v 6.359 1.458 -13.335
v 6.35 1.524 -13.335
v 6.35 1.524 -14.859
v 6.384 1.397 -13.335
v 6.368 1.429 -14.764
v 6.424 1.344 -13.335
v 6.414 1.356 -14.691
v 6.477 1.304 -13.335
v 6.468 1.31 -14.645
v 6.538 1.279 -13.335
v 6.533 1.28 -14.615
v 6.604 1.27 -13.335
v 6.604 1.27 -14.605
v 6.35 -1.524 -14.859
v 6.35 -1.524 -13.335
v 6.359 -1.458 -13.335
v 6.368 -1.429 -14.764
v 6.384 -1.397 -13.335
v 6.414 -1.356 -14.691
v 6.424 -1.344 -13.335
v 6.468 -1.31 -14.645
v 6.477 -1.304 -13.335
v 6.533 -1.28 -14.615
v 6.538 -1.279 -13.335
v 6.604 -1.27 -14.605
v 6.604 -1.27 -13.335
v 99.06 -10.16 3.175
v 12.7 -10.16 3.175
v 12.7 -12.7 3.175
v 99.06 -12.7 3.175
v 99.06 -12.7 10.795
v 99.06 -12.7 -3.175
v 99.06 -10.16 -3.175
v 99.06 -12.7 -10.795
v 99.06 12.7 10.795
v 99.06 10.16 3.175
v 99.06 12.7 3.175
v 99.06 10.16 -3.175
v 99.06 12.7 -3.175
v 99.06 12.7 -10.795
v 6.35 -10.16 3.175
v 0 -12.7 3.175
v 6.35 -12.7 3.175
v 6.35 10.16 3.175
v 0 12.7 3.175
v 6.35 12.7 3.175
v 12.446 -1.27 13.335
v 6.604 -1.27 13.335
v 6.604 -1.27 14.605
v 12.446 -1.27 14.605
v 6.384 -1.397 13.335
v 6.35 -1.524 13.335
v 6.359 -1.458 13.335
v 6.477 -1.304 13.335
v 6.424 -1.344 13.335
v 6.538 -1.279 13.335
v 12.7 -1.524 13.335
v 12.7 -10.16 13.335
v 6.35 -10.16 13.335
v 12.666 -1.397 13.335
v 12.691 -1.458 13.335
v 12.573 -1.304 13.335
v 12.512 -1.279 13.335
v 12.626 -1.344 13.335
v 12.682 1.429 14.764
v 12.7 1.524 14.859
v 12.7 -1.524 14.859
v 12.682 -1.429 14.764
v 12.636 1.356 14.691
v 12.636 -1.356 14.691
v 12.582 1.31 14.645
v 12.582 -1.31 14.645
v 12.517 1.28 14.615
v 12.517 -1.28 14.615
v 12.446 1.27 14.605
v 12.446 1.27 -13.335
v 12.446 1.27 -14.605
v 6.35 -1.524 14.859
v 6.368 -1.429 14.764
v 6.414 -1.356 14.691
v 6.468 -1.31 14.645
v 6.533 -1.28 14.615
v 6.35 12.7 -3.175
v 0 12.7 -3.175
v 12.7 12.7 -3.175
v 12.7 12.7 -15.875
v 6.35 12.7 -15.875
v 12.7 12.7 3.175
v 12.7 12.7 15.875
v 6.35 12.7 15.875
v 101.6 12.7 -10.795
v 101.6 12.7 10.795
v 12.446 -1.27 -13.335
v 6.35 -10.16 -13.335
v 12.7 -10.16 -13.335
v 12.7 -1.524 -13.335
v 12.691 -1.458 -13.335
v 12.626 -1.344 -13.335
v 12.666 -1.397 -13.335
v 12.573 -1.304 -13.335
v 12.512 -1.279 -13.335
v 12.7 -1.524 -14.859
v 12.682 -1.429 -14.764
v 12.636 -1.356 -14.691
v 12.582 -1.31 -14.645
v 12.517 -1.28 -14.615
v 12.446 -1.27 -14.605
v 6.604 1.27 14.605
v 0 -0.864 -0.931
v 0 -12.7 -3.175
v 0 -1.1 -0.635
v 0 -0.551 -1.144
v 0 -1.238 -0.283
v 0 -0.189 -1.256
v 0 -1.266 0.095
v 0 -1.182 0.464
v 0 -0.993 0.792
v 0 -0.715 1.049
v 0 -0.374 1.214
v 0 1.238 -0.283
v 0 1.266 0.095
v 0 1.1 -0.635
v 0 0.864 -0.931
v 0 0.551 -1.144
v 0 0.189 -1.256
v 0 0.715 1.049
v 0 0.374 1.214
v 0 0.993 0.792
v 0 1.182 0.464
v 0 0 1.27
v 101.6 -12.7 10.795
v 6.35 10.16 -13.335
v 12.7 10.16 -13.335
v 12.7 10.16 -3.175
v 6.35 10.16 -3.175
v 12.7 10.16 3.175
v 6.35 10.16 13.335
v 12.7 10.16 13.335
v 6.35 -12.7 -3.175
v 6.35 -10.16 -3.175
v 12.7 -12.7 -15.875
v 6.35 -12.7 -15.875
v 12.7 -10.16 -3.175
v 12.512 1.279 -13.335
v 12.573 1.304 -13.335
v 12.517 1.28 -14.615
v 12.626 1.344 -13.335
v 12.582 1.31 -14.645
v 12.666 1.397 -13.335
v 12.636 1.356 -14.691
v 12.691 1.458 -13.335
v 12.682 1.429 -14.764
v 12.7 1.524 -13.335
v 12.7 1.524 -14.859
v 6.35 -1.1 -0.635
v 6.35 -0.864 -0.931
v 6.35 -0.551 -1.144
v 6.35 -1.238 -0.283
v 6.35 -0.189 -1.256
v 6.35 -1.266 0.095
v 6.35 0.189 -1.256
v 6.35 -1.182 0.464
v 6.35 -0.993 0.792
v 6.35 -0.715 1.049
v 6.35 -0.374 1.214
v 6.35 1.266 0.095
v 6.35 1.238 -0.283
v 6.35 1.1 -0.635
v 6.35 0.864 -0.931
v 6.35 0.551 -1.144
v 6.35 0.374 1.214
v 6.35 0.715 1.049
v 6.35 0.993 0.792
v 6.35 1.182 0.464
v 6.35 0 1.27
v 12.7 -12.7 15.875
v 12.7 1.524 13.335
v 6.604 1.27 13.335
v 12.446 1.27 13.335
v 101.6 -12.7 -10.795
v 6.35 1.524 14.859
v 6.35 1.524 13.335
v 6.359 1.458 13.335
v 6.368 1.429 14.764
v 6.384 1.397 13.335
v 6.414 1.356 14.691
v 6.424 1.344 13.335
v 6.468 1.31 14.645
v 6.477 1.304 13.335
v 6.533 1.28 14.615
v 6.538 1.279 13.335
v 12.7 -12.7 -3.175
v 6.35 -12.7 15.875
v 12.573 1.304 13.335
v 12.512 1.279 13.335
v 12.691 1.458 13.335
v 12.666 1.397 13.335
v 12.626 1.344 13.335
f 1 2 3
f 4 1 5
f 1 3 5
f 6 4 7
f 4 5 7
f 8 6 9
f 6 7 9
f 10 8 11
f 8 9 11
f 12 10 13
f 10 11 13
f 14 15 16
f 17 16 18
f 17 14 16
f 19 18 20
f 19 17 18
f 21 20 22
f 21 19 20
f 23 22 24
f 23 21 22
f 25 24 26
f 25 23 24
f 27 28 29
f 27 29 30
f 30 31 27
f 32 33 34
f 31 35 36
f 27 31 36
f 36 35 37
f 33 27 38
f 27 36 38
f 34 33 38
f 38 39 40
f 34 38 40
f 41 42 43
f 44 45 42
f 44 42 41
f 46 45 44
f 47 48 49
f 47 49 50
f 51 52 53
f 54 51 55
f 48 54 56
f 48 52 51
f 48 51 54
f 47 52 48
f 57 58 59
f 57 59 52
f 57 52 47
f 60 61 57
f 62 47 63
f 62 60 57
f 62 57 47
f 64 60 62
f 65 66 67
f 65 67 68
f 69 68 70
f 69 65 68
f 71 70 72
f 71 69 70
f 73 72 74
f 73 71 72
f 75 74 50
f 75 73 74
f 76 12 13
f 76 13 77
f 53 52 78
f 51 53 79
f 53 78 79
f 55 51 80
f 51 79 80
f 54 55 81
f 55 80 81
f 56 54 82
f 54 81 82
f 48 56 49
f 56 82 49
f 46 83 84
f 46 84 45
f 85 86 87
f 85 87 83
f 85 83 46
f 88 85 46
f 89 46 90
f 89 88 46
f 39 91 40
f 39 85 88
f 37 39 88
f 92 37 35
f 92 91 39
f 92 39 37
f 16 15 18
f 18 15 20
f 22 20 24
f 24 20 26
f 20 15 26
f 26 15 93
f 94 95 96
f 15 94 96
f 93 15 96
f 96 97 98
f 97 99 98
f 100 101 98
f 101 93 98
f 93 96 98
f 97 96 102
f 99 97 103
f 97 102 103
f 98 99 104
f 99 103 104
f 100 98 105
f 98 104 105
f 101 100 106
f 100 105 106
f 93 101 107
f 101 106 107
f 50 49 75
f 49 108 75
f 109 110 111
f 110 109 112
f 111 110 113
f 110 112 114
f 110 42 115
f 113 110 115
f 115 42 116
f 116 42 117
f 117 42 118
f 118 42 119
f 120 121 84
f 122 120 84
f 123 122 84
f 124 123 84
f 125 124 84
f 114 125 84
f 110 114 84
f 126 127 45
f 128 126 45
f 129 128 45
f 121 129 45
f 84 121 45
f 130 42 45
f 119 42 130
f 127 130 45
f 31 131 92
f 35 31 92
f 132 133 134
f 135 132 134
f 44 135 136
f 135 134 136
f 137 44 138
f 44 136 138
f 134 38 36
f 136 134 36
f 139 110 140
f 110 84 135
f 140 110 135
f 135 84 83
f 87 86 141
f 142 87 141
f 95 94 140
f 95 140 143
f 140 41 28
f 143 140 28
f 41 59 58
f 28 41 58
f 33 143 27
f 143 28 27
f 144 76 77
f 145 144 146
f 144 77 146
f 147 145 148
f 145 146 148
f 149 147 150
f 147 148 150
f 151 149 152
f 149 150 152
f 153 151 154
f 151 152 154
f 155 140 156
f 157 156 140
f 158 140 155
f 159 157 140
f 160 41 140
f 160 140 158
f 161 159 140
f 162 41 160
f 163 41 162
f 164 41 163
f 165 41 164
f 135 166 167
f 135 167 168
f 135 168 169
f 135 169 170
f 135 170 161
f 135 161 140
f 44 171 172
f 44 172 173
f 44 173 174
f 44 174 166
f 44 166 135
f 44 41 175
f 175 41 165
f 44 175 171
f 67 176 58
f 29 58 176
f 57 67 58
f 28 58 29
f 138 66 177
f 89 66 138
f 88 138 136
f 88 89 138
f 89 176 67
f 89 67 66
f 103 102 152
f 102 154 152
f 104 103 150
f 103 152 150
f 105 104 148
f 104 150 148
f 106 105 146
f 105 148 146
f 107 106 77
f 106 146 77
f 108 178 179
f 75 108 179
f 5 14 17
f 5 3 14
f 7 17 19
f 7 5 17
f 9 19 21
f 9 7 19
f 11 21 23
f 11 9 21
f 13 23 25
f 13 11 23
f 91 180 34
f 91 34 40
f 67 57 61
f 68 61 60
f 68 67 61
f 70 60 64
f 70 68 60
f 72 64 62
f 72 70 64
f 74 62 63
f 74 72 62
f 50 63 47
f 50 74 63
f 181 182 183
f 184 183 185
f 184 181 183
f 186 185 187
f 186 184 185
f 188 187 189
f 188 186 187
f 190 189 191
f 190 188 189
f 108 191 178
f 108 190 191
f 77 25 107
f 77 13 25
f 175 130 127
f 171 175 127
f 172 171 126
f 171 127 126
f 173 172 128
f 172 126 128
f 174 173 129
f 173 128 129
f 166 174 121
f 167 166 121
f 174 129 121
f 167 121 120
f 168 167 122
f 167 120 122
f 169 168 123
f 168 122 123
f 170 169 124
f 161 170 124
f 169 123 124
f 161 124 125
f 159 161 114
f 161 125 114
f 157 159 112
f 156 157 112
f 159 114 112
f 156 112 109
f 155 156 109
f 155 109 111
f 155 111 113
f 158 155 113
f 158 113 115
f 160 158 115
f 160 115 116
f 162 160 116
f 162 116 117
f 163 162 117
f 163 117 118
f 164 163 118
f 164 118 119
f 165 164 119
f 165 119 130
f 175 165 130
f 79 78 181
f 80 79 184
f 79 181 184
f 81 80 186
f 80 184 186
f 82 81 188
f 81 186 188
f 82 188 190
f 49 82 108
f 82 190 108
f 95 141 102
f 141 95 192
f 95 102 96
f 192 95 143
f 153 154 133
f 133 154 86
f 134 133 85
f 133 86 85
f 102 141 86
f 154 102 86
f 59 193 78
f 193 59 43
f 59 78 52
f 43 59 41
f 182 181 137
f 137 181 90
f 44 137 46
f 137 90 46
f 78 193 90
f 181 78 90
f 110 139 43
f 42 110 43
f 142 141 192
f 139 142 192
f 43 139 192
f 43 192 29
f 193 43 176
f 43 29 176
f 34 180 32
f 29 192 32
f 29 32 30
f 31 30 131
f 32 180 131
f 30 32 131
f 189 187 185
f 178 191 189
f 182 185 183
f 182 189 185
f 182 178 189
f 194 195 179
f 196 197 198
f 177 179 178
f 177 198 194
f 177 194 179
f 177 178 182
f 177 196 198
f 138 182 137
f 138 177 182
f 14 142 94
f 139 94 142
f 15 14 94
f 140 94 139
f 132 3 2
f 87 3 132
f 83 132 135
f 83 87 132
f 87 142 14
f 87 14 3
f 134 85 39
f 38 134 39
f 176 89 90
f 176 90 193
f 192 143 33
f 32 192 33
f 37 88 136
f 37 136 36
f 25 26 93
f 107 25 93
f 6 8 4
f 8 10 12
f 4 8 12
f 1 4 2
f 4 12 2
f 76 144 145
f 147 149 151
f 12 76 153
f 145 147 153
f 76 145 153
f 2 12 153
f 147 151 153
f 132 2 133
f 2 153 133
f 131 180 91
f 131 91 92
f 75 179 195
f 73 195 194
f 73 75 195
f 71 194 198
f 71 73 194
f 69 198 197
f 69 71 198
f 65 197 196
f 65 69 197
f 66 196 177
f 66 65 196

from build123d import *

# Parameters (mm, degrees)
SKETCH1_W            = 101.6
SKETCH1_H            = 25.4
BOSS_EXTRUDE1_DEPTH  = 3.175
BOSS_EXTRUDE2_DEPTH  = 6.35
SKETCH4_W            = 6.35
SKETCH4_H            = 2.54
CUT_EXTRUDE2_DEPTH   = 1.27
FILLET2_R            = 0.254
FILLET3_R            = 0.254
FILLET2_OF_MIRROR4_R = 0.254
FILLET3_OF_MIRROR4_R = 0.254
SKETCH6_W            = 7.62
SKETCH6_H            = 25.4
BOSS_EXTRUDE4_DEPTH  = 2.54
CUT_EXTRUDE3_REACH   = 21.05
SKETCH7_W            = 92.71
SKETCH7_H            = 20.32
CUT_EXTRUDE4_REACH   = 103.6
SKETCH8_R            = 1.27


with BuildPart() as part:
    # Sketch1 → Boss-Extrude1 (new body, symmetric)
    with BuildSketch(Plane.XY):
        with Locations((50.8, 0)):
            Rectangle(SKETCH1_W, SKETCH1_H)
    extrude(amount=BOSS_EXTRUDE1_DEPTH, both=True)

    # Sketch2 → Boss-Extrude2 (add)
    with BuildSketch(Plane.ZY.offset(-12.7)):
        Polygon((-3.175, 12.7), (-15.875, 12.7), (-15.875, -12.7), (-3.175, -12.7), (-3.175, -10.16), (-13.335, -10.16), (-13.335, 10.16), (-3.175, 10.16), align=None)
    boss_extrude2 = extrude(amount=BOSS_EXTRUDE2_DEPTH)

    # Sketch4 → Cut-Extrude2 (cut)
    with BuildSketch(Plane.XY.offset(-13.335)):
        with Locations((9.525, 0)):
            Rectangle(SKETCH4_W, SKETCH4_H)
    cut_extrude2 = extrude(amount=-CUT_EXTRUDE2_DEPTH, mode=Mode.SUBTRACT)

    # Fillet2
    fillet2_edges = [part.edges().sort_by_distance(p)[0] for p in [
        (6.35, 0, -14.605),
        (6.35, -1.27, -13.97),
        (6.35, 1.27, -13.97),
    ]]
    fillet(fillet2_edges, radius=FILLET2_R)

    # Fillet3
    fillet3_edges = [part.edges().sort_by_distance(p)[0] for p in [
        (12.7, 0, -14.605),
        (12.7, 1.27, -13.97),
        (12.7, -1.27, -13.97),
    ]]
    fillet(fillet3_edges, radius=FILLET3_R)

    # Mirror4: Boss-Extrude2, Cut-Extrude2 across plane
    add(boss_extrude2.mirror(Plane.XY))
    add(cut_extrude2.mirror(Plane.XY), mode=Mode.SUBTRACT)

    # Fillet2 of Mirror4
    fillet2_of_mirror4_edges = [part.edges().sort_by_distance(p)[0] for p in [
        (6.35, 0, 14.605),
        (6.35, -1.27, 13.97),
        (6.35, 1.27, 13.97),
    ]]
    fillet(fillet2_of_mirror4_edges, radius=FILLET2_OF_MIRROR4_R)

    # Fillet3 of Mirror4
    fillet3_of_mirror4_edges = [part.edges().sort_by_distance(p)[0] for p in [
        (12.7, 0, 14.605),
        (12.7, 1.27, 13.97),
        (12.7, -1.27, 13.97),
    ]]
    fillet(fillet3_of_mirror4_edges, radius=FILLET3_OF_MIRROR4_R)

    # Sketch6 → Boss-Extrude4 (add)
    with BuildSketch(Plane(origin=(101.6, 0, 0), x_dir=(0, 0, -1), z_dir=(1, 0, 0))):
        with Locations((6.985, 0)):
            Rectangle(SKETCH6_W, SKETCH6_H)
    boss_extrude4 = extrude(amount=-BOSS_EXTRUDE4_DEPTH)

    # Mirror5: Boss-Extrude4 across plane
    add(boss_extrude4.mirror(Plane.XY))

    # Sketch7 → Cut-Extrude3 (cut, up to next)
    with BuildSketch(Plane.XY.offset(3.175), mode=Mode.PRIVATE) as cut_extrude3_sk1:
        with Locations((52.705, 0)):
            Rectangle(SKETCH7_W, SKETCH7_H)
    cut_extrude3_tool1 = extrude(cut_extrude3_sk1.sketch, amount=-CUT_EXTRUDE3_REACH, mode=Mode.PRIVATE) & part.part
    add(cut_extrude3_tool1.solids().sort_by_distance((52.705, 0, 3.175))[0], mode=Mode.SUBTRACT)

    # Sketch8 → Cut-Extrude4 (cut, up to next)
    with BuildSketch(Plane.ZY, mode=Mode.PRIVATE) as cut_extrude4_sk1:
        Circle(SKETCH8_R)
    cut_extrude4_tool1 = extrude(cut_extrude4_sk1.sketch, amount=-CUT_EXTRUDE4_REACH, mode=Mode.PRIVATE) & part.part
    add(cut_extrude4_tool1.solids().sort_by_distance((0, 0, 0))[0], mode=Mode.SUBTRACT)


solid = part.part
